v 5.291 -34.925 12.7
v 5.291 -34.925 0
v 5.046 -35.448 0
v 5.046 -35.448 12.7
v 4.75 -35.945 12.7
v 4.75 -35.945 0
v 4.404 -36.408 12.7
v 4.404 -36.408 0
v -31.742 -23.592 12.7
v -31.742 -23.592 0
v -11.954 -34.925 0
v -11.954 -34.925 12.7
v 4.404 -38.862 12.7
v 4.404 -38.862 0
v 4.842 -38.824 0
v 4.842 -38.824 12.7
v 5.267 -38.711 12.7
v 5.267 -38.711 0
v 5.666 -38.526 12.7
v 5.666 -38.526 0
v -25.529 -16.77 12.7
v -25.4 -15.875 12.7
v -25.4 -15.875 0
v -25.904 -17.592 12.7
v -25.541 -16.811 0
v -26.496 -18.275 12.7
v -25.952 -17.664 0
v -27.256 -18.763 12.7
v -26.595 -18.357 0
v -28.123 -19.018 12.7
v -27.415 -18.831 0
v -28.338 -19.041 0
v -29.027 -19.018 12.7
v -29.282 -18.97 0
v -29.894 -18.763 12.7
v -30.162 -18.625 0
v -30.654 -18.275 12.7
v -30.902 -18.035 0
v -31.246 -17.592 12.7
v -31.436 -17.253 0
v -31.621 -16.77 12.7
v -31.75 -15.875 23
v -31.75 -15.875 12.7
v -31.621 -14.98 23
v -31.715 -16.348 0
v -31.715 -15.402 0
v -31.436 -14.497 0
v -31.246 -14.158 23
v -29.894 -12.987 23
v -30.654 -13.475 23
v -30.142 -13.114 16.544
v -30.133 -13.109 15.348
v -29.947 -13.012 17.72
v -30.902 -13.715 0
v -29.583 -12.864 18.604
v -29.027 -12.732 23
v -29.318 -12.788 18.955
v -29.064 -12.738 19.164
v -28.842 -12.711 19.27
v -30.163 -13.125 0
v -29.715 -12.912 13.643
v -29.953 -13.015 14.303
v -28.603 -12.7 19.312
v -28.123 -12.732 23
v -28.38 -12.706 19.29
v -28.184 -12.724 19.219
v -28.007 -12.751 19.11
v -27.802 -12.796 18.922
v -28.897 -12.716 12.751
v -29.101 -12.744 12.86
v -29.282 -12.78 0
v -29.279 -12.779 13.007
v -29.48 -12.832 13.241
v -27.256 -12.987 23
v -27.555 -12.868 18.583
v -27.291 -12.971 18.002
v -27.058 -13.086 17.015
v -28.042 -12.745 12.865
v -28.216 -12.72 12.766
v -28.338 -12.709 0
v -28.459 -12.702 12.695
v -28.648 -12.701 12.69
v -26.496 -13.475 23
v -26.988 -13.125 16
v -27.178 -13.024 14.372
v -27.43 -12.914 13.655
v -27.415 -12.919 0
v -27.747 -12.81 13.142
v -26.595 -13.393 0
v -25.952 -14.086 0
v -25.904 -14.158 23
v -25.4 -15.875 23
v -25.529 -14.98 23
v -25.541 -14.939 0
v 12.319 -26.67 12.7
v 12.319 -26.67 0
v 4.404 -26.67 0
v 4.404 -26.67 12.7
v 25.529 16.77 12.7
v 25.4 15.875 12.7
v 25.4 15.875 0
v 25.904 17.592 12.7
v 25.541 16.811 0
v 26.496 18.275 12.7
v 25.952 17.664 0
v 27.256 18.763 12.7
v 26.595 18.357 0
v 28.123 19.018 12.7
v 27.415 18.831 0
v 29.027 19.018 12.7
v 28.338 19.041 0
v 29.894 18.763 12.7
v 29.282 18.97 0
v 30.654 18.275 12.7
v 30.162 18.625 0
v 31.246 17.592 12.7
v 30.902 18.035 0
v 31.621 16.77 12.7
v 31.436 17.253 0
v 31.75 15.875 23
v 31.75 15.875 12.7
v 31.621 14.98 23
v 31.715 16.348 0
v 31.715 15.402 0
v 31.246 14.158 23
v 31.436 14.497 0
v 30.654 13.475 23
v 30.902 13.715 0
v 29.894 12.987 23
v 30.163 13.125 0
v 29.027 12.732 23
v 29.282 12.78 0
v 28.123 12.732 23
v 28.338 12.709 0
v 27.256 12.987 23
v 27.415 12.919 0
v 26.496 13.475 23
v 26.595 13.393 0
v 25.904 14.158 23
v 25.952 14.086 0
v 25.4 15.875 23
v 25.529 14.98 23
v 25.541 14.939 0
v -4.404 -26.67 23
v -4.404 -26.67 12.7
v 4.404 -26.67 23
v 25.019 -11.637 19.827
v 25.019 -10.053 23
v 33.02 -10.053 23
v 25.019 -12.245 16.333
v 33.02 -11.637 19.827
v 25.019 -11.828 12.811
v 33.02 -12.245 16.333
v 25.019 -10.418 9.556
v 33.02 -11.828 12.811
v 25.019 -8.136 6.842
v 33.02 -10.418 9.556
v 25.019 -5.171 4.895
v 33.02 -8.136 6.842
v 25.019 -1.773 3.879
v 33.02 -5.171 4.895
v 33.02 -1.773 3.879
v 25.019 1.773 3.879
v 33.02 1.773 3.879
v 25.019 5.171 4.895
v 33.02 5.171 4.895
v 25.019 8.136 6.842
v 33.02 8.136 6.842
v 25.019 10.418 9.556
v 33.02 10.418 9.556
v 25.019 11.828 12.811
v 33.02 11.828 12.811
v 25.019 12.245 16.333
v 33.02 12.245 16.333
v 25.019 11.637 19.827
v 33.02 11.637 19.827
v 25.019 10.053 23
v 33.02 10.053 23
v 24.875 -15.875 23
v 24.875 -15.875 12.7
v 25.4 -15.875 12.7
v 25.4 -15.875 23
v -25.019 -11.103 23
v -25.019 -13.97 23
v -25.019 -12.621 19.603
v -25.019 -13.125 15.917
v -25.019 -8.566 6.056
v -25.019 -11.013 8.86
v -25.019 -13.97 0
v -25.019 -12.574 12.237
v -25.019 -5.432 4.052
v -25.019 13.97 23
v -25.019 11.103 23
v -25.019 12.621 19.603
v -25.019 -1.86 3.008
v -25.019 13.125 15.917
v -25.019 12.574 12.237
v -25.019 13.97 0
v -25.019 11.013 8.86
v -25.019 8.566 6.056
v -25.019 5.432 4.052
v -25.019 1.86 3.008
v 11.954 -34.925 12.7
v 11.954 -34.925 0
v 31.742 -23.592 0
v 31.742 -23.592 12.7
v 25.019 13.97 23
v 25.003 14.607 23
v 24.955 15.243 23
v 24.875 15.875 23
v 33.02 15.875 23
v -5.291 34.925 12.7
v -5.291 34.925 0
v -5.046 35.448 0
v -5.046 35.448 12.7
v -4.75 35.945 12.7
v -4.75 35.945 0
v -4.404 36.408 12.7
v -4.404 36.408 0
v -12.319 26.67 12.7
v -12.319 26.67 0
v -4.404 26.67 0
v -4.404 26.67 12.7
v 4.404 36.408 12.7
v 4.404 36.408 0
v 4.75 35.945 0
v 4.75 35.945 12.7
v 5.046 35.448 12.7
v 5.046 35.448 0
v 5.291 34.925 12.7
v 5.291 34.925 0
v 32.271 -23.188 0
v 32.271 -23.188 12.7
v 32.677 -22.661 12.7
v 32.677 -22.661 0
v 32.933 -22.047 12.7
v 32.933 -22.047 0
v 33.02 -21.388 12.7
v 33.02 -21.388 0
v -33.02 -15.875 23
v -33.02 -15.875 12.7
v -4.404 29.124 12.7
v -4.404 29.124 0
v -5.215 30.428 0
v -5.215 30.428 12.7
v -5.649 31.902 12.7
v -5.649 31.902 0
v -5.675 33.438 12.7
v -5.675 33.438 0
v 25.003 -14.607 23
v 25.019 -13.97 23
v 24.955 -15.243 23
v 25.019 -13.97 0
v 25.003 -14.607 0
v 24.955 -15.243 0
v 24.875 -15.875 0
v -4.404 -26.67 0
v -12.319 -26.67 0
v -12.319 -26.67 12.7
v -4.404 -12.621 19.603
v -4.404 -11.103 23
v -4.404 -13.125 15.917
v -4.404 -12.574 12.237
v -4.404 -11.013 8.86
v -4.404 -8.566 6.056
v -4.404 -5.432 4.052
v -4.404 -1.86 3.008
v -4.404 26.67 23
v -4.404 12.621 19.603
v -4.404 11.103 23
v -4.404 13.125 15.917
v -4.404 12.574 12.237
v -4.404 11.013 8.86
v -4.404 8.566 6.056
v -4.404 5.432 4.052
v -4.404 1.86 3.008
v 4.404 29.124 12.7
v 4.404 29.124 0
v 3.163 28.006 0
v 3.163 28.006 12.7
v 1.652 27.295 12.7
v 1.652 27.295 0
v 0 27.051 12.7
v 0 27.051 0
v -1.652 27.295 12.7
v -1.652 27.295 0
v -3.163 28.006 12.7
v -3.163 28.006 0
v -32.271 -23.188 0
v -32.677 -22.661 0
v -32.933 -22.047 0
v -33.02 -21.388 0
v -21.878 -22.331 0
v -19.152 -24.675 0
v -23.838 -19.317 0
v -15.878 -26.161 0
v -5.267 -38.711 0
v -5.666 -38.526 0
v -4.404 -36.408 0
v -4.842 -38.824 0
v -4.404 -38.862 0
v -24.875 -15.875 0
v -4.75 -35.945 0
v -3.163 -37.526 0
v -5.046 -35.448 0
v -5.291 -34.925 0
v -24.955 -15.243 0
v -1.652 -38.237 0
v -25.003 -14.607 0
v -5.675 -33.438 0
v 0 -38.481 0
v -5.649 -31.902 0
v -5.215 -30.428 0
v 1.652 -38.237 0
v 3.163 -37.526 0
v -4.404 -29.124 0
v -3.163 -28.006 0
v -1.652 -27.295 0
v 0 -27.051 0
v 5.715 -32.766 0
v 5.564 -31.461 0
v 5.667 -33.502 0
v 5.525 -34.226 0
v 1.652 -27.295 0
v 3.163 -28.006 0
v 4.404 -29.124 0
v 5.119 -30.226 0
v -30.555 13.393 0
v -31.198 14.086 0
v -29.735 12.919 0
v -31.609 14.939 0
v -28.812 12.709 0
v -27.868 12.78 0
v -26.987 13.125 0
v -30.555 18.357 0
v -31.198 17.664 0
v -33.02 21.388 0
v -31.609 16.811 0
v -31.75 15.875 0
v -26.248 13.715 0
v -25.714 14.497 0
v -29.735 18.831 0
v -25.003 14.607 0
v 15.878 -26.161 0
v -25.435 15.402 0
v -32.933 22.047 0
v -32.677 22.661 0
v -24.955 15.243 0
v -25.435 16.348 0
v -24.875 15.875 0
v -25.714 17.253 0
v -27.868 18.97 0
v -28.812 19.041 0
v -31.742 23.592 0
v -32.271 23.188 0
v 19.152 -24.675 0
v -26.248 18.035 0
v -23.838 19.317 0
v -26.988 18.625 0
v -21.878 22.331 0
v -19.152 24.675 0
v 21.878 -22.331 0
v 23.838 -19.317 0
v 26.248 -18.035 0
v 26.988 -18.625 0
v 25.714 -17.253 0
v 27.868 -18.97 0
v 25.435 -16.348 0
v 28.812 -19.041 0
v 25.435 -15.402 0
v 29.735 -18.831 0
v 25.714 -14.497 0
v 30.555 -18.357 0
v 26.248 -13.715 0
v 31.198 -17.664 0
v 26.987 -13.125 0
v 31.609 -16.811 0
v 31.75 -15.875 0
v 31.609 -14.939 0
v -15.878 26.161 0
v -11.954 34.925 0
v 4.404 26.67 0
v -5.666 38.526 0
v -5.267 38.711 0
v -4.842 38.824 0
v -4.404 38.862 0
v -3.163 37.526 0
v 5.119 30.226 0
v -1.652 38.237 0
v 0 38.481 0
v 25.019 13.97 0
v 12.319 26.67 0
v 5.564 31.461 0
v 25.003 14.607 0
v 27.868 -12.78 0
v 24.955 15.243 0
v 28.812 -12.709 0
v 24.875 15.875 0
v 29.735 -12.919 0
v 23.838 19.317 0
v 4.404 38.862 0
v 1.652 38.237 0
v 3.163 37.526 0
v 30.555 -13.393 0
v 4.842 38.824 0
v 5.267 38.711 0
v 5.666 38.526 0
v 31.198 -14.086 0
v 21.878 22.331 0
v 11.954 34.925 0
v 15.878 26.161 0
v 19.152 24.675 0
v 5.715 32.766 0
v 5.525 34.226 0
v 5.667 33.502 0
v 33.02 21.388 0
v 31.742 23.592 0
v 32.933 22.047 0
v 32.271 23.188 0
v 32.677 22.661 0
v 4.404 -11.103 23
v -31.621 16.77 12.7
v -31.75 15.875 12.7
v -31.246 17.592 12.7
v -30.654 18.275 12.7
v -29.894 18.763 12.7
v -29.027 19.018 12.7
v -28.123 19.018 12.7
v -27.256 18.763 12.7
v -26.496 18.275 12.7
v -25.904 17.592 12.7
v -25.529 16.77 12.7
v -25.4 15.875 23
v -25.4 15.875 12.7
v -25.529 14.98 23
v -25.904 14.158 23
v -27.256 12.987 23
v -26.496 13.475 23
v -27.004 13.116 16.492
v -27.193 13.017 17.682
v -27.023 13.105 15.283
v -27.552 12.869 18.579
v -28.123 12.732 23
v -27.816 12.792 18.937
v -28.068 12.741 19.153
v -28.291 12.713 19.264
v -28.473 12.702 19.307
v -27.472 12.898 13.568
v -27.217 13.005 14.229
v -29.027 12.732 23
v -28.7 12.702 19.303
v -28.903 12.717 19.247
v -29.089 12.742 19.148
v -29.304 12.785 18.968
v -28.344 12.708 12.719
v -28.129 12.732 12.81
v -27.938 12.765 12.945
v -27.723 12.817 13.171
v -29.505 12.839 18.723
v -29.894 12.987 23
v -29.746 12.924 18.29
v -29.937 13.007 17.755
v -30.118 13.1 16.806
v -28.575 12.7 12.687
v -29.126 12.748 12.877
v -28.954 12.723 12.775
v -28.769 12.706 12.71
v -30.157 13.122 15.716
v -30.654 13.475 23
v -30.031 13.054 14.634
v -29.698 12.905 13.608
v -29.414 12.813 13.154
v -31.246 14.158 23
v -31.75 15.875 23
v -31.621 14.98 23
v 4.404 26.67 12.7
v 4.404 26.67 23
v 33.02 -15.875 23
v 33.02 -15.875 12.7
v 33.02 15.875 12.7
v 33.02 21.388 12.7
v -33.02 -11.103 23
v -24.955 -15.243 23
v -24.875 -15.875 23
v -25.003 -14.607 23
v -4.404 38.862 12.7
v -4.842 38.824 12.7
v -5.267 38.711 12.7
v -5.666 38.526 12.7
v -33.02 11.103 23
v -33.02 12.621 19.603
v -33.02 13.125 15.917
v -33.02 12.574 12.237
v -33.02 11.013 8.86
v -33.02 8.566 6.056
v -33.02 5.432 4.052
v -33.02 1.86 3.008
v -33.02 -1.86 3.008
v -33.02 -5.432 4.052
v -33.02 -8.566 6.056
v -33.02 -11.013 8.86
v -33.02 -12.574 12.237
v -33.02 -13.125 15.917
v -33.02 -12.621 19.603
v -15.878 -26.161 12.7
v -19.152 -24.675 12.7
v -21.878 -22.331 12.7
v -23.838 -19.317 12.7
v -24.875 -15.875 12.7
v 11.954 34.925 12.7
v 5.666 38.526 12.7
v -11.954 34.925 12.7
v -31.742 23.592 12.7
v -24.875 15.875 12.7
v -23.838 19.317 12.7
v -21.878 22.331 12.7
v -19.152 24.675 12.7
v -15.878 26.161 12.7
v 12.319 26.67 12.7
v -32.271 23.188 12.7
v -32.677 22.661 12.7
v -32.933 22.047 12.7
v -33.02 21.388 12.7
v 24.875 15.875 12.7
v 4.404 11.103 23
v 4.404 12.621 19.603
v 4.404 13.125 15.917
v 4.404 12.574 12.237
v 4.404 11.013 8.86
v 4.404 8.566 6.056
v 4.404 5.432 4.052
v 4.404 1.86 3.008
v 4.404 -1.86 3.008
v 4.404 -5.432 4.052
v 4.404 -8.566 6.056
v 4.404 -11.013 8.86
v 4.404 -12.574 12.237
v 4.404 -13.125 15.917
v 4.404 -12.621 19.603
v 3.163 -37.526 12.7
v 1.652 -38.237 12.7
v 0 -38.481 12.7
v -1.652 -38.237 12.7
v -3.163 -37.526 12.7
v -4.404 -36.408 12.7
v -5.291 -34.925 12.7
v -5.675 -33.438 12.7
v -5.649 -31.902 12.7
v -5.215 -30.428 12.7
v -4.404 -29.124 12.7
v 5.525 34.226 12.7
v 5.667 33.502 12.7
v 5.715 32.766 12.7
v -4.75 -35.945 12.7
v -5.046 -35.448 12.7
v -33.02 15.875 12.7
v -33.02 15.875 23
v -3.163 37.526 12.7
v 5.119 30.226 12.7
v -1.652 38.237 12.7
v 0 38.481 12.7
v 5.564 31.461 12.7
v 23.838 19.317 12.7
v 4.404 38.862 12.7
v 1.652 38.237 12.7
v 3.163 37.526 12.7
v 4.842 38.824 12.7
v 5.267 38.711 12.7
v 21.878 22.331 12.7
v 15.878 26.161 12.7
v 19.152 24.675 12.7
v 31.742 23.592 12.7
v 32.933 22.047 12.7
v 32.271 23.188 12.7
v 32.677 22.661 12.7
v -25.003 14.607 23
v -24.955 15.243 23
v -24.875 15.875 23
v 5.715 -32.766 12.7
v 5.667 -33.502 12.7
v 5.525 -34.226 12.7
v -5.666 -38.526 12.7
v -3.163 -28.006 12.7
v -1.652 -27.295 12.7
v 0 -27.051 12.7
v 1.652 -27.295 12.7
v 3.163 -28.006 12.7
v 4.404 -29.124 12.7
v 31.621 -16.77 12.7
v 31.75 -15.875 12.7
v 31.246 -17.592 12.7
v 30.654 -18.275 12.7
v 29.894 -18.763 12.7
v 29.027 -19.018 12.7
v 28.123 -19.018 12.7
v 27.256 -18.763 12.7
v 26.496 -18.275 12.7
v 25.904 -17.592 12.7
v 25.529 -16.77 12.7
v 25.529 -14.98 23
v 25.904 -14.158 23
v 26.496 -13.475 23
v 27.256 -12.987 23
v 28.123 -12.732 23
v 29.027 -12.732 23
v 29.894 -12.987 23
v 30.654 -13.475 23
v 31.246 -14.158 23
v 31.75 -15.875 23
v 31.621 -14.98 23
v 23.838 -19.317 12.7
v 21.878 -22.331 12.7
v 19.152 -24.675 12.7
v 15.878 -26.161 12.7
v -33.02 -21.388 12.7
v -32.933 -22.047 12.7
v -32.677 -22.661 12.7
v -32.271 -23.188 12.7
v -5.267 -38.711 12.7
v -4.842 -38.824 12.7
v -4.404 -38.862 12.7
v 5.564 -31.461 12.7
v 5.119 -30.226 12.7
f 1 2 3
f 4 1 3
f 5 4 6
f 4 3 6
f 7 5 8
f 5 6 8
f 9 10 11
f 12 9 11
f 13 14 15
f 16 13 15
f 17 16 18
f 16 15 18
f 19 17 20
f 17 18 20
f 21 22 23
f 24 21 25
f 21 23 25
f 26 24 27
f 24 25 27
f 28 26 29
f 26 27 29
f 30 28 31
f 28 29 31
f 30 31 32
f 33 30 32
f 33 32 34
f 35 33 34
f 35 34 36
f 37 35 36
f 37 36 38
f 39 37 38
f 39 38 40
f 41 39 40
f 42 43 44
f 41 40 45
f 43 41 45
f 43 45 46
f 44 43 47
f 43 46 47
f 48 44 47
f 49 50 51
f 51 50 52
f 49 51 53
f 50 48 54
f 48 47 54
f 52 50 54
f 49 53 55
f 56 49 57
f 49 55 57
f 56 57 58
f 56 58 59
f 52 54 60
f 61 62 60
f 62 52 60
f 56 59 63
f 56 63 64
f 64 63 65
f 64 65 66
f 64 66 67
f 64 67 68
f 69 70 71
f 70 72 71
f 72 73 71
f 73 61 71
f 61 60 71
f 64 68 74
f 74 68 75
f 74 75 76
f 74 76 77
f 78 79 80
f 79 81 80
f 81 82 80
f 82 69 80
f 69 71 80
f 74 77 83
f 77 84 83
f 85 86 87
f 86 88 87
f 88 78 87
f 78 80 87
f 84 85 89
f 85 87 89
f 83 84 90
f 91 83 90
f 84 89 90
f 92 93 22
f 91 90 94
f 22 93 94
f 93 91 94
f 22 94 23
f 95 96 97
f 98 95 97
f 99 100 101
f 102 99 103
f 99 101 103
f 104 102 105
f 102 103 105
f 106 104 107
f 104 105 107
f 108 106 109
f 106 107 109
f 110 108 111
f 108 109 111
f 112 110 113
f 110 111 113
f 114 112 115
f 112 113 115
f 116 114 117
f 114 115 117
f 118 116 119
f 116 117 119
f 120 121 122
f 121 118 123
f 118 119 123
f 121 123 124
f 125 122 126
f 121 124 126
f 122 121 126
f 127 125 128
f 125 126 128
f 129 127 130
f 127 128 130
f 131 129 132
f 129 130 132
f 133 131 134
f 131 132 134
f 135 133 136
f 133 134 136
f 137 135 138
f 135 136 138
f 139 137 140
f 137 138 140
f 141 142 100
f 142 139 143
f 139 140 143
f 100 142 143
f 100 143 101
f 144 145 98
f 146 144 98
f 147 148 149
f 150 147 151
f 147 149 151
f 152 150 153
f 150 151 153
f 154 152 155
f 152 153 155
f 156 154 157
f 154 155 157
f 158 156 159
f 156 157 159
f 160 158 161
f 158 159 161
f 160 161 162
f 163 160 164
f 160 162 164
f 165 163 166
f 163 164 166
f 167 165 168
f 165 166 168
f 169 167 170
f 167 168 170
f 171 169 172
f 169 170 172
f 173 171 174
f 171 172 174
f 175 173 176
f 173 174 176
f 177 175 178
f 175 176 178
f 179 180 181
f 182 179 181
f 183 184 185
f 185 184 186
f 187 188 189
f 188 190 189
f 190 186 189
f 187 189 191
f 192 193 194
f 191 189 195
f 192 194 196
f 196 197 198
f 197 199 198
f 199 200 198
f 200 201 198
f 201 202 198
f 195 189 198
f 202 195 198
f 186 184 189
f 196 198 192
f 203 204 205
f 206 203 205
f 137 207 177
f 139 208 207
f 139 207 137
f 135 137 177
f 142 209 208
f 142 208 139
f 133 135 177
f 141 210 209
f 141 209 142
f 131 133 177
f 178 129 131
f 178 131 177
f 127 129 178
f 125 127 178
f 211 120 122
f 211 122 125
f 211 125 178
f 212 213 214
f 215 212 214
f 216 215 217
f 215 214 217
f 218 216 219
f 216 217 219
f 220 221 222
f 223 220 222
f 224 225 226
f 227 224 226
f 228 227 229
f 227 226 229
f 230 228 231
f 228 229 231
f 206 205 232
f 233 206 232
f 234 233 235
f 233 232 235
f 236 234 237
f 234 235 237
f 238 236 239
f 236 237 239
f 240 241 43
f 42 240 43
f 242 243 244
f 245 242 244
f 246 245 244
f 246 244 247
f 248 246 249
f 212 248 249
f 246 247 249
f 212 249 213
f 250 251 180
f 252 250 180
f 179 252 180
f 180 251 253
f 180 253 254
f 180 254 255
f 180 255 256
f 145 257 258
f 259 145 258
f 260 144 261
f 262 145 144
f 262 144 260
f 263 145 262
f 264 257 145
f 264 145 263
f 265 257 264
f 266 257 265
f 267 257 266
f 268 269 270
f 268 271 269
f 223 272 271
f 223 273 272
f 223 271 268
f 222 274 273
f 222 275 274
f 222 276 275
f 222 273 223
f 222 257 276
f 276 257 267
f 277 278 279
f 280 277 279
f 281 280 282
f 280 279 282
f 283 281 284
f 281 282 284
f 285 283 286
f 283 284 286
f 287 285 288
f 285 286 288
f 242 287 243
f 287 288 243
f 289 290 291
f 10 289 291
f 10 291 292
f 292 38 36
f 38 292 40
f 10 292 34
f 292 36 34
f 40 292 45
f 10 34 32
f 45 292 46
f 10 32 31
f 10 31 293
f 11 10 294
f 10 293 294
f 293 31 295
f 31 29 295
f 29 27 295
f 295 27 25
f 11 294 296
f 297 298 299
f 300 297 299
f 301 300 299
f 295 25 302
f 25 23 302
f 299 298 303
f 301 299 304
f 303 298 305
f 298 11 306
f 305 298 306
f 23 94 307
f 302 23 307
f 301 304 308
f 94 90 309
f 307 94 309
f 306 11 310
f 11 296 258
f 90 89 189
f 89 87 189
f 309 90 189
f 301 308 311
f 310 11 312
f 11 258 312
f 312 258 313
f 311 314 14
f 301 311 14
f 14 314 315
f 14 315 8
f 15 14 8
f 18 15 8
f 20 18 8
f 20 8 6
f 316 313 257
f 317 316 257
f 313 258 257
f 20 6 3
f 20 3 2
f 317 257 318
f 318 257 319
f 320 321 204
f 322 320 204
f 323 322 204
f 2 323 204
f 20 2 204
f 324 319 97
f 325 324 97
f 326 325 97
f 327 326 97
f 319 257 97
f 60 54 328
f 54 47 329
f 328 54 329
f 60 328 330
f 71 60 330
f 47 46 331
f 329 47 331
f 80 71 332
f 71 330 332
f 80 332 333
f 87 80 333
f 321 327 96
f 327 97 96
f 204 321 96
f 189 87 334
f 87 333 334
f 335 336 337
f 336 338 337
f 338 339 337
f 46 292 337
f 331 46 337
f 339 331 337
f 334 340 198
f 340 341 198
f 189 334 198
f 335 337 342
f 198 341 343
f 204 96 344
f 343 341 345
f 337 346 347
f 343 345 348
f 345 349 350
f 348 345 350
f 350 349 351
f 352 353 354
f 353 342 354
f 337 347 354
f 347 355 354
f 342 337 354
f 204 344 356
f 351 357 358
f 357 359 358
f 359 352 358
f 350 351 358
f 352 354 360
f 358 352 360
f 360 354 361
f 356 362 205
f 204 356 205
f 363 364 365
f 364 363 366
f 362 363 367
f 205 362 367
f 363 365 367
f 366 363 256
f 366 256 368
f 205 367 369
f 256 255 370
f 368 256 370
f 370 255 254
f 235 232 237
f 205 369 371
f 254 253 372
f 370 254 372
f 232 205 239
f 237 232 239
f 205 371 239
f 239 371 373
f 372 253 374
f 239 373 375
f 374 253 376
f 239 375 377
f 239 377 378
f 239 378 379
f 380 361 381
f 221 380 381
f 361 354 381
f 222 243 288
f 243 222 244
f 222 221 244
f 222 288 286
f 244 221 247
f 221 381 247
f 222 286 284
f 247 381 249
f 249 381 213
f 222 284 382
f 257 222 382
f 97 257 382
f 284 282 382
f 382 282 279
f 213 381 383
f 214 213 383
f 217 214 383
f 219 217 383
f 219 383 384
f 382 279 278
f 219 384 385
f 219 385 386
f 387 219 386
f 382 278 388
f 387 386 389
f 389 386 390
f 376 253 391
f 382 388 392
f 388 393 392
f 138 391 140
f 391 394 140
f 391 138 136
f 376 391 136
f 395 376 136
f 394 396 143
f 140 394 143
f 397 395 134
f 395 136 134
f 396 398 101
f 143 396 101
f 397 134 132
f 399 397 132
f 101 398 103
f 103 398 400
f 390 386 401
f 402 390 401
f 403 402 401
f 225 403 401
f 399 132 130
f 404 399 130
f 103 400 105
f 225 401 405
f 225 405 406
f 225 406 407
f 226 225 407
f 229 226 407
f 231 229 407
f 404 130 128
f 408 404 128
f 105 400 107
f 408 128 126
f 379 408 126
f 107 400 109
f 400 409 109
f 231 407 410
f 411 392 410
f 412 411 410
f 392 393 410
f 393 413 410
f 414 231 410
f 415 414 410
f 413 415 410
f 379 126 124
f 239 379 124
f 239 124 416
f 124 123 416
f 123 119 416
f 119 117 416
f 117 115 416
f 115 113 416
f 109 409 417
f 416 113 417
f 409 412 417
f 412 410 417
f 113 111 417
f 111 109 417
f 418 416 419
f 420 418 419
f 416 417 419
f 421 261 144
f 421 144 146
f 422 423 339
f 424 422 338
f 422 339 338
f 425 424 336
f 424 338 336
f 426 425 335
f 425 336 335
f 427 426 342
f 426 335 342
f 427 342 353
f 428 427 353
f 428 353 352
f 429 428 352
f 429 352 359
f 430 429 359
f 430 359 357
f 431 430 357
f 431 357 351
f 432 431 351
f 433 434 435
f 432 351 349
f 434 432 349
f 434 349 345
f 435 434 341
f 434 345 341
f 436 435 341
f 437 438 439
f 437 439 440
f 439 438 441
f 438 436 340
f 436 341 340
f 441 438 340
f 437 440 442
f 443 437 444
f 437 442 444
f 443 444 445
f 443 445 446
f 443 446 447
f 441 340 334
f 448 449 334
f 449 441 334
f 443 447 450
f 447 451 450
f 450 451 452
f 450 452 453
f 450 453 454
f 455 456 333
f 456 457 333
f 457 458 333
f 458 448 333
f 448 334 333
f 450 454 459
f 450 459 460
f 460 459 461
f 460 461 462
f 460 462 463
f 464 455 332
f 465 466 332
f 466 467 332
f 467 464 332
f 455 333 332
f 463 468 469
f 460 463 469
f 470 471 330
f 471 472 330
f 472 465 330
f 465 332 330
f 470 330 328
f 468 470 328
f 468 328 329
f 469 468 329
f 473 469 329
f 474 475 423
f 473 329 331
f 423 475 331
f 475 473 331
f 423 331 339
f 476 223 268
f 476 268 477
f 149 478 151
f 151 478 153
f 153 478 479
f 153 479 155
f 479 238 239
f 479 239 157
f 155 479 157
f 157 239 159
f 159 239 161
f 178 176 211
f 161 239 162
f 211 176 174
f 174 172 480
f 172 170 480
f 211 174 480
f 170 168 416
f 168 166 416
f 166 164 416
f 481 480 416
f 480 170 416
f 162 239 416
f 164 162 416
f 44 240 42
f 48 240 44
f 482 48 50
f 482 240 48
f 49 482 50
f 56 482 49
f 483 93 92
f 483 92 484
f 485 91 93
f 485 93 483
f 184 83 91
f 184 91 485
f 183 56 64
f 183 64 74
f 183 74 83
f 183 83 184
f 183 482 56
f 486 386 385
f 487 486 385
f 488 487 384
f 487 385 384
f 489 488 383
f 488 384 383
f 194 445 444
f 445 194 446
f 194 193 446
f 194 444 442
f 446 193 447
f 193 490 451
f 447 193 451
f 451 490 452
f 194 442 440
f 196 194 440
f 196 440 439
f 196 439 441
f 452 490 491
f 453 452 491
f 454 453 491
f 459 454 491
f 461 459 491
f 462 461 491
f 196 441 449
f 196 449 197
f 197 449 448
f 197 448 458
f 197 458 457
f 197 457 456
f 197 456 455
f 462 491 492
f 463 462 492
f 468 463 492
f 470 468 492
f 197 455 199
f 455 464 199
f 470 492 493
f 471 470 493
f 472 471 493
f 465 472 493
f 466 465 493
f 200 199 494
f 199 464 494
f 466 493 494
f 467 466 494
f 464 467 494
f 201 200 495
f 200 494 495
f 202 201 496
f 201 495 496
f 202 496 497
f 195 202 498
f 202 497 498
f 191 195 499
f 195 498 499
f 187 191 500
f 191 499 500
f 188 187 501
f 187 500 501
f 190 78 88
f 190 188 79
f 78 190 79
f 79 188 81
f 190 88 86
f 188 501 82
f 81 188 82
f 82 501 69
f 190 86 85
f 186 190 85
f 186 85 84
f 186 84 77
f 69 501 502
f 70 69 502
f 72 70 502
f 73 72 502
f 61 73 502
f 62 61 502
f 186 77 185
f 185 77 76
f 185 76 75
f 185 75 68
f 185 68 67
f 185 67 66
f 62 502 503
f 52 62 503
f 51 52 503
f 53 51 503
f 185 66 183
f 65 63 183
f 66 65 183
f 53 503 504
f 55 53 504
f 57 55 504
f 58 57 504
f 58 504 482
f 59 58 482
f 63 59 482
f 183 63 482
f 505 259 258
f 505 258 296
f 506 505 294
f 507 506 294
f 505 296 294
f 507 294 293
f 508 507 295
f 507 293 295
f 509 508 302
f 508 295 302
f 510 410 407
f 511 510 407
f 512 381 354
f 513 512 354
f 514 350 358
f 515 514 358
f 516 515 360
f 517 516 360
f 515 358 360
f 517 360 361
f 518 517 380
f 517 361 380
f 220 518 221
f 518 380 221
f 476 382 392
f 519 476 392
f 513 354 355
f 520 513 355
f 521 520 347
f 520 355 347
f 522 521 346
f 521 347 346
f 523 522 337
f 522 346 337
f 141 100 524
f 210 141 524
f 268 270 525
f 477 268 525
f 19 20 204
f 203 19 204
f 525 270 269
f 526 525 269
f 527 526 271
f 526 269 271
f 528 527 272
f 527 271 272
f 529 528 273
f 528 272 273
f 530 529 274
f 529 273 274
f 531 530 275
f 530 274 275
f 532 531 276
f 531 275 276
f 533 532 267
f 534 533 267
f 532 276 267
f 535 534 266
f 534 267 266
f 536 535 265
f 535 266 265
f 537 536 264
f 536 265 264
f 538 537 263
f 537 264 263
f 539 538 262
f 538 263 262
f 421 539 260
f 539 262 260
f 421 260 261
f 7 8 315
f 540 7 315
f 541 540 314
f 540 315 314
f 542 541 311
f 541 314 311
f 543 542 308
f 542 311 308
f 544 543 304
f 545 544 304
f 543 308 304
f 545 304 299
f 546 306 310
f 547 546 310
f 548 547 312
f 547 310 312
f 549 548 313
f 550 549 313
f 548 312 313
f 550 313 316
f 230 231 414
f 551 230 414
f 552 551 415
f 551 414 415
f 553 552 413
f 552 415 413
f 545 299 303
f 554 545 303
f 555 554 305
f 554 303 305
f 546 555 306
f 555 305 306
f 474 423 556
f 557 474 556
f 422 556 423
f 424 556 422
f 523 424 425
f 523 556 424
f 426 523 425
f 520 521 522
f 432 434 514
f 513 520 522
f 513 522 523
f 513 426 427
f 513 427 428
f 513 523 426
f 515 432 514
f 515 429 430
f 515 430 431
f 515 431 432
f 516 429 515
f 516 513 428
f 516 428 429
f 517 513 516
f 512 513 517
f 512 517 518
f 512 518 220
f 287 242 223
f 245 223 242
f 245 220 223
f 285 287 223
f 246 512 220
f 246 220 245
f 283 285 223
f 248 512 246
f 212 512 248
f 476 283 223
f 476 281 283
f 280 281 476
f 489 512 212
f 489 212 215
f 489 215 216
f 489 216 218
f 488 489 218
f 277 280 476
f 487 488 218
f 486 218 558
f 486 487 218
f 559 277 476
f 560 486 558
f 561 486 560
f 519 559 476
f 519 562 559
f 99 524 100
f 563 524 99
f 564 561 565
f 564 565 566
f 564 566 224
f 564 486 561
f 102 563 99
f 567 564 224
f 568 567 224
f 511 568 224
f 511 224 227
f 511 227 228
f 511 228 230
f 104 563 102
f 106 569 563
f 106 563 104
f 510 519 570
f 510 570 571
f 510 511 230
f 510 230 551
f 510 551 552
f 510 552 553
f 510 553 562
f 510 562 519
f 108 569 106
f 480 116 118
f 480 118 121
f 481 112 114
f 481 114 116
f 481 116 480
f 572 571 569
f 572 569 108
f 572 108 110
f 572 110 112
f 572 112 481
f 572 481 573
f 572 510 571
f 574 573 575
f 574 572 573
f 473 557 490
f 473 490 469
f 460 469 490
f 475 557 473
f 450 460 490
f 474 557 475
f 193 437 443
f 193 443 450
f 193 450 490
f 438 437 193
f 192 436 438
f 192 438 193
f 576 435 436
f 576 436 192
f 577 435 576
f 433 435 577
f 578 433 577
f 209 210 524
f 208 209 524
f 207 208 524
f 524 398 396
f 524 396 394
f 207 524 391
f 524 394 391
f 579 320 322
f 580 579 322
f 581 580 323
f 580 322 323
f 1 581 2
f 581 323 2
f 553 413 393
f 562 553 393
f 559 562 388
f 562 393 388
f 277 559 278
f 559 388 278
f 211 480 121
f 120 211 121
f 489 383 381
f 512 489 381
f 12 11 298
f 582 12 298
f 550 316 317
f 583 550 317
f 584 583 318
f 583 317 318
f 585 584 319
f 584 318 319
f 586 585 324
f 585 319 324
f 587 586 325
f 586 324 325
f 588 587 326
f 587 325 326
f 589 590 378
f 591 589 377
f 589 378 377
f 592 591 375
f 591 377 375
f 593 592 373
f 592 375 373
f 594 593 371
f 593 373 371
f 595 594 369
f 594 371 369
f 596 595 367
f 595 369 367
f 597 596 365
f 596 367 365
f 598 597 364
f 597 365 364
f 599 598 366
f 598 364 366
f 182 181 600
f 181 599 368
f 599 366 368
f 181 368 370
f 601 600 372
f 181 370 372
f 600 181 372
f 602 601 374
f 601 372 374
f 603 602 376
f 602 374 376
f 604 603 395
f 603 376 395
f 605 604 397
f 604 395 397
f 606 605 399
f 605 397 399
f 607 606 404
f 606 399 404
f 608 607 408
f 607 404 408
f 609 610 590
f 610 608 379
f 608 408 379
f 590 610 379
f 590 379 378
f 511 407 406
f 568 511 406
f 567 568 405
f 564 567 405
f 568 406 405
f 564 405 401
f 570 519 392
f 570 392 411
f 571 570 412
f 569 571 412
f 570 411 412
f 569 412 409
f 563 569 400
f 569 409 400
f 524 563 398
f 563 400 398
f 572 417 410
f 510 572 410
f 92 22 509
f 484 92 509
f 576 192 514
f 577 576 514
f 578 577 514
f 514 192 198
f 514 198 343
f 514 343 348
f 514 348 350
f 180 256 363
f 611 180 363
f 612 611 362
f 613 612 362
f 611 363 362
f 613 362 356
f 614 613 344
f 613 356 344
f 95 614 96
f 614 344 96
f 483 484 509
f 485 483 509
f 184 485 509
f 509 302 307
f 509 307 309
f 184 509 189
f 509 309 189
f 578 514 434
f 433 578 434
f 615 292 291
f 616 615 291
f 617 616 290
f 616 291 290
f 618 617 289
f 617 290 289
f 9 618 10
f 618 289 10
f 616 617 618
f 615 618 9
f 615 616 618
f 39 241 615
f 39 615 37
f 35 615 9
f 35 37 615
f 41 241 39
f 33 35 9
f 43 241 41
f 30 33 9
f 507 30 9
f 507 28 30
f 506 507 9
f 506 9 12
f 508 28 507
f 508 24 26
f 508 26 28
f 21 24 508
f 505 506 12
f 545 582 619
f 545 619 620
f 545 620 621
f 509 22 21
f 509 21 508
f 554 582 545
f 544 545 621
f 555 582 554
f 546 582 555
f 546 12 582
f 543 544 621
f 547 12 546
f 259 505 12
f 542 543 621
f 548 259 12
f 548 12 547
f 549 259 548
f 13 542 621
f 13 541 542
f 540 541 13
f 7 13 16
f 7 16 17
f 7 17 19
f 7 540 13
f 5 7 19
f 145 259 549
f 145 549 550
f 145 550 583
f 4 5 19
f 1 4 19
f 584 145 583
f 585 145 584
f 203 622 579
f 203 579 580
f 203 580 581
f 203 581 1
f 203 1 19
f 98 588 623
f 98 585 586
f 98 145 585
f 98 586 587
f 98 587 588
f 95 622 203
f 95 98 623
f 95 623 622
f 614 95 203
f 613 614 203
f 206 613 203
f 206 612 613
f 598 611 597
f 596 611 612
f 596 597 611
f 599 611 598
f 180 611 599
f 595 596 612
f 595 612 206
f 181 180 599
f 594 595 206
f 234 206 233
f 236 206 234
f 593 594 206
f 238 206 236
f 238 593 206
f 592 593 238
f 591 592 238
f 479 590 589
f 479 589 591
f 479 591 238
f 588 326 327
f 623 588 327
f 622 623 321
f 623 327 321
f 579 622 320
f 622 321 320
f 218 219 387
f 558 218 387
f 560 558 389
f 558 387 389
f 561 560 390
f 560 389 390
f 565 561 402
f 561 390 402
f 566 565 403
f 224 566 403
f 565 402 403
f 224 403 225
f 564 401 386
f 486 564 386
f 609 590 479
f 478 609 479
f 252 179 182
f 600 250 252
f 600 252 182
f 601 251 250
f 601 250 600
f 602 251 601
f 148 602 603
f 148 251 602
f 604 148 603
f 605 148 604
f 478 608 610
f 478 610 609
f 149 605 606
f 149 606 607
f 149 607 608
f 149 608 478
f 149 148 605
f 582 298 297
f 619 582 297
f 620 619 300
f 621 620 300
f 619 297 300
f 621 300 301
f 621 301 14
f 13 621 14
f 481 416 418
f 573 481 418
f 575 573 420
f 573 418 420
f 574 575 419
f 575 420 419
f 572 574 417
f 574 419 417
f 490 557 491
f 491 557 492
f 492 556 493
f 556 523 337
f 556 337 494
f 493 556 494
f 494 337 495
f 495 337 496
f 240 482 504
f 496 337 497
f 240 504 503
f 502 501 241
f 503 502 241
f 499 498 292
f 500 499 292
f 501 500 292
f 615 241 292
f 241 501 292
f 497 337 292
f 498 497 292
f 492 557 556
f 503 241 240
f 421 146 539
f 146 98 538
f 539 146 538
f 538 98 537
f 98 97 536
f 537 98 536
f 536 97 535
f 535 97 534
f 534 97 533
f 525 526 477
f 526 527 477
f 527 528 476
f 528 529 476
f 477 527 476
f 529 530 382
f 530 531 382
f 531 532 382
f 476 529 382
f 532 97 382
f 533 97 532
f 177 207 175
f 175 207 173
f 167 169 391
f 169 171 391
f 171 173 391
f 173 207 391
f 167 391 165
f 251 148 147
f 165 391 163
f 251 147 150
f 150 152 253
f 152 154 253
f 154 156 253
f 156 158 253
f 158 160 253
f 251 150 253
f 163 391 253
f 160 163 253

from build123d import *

# Parameters (mm, degrees)
BOSS_EXTRUDE1_DEPTH = 12.7
SKETCH1_4_W         = 8.808271716
SKETCH1_4_H         = 53.34
BOSS_EXTRUDE3_DEPTH = 23
CUT_EXTRUDE3_REACH  = 82.003
SKETCH9_R           = 13.125
CUT_EXTRUDE4_REACH  = 82.003
SKETCH8_R           = 12.25


with BuildPart() as part:
    # Sketch1 → Boss-Extrude1 (new body)
    with BuildSketch(Plane.XY):
        with BuildLine():
            Line((4.404135858, -36.408089009), (4.404135858, -38.862))
            ThreePointArc((4.404135858, -38.862), (5.057273366, -38.776589863), (5.666486021, -38.52610346))
            Line((5.666486021, -38.52610346), (11.954126984, -34.925))
            Line((11.954126984, -34.925), (5.291497331, -34.925))
            ThreePointArc((5.291497331, -34.925), (4.904203705, -35.700282028), (4.404135858, -36.408089009))
        make_face()
        with BuildLine():
            Line((-4.404135858, -36.408089009), (-4.404135858, -38.862))
            Line((-4.404135858, -38.862), (4.404135858, -38.862))
            Line((4.404135858, -38.862), (4.404135858, -36.408089009))
            ThreePointArc((4.404135858, -36.408089009), (0, -38.481), (-4.404135858, -36.408089009))
        make_face()
        with BuildLine():
            Line((4.404135858, -26.67), (4.404135858, -29.123910991))
            ThreePointArc((4.404135858, -29.123910991), (5.377307013, -30.830594542), (5.715, -32.766))
            ThreePointArc((5.715, -32.766), (5.60812501, -33.866072215), (5.291497331, -34.925))
            Line((5.291497331, -34.925), (11.954126984, -34.925))
            Line((11.954126984, -34.925), (31.742350164, -23.591744906))
            ThreePointArc((31.742350164, -23.591744906), (32.677495098, -22.661460621), (33.02, -21.387641446))
            Line((33.02, -21.387641446), (33.02, -15.875))
            Line((33.02, -15.875), (31.75, -15.875))
            ThreePointArc((31.75, -15.875), (28.575, -19.05), (25.4, -15.875))
            Line((25.4, -15.875), (24.875312158, -15.875))
            ThreePointArc((24.875312158, -15.875), (20.598387055, -23.600251814), (12.319, -26.67))
            Line((12.319, -26.67), (4.404135858, -26.67))
        make_face()
        with BuildLine():
            Line((-33.02, -15.875), (-33.02, -21.387641446))
            ThreePointArc((-33.02, -21.387641446), (-32.677495098, -22.661460621), (-31.742350164, -23.591744906))
            Line((-31.742350164, -23.591744906), (-11.954126984, -34.925))
            Line((-11.954126984, -34.925), (-5.291497331, -34.925))
            ThreePointArc((-5.291497331, -34.925), (-5.649290588, -31.901858317), (-4.404135858, -29.123910991))
            Line((-4.404135858, -29.123910991), (-4.404135858, -26.67))
            Line((-4.404135858, -26.67), (-12.319, -26.67))
            ThreePointArc((-12.319, -26.67), (-20.598387055, -23.600251814), (-24.875312158, -15.875))
            Line((-24.875312158, -15.875), (-25.4, -15.875))
            ThreePointArc((-25.4, -15.875), (-28.575, -19.05), (-31.75, -15.875))
            Line((-31.75, -15.875), (-33.02, -15.875))
        make_face()
        with BuildLine():
            Line((-5.291497331, -34.925), (-11.954126984, -34.925))
            Line((-11.954126984, -34.925), (-5.666486021, -38.52610346))
            ThreePointArc((-5.666486021, -38.52610346), (-5.057273366, -38.776589863), (-4.404135858, -38.862))
            Line((-4.404135858, -38.862), (-4.404135858, -36.408089009))
            ThreePointArc((-4.404135858, -36.408089009), (-4.904203705, -35.700282028), (-5.291497331, -34.925))
        make_face()
        with BuildLine():
            Line((-4.404135858, -26.67), (-4.404135858, -29.123910991))
            ThreePointArc((-4.404135858, -29.123910991), (0, -27.051), (4.404135858, -29.123910991))
            Line((4.404135858, -29.123910991), (4.404135858, -26.67))
            Line((4.404135858, -26.67), (-4.404135858, -26.67))
        make_face()
        with BuildLine():
            Line((4.404135858, 29.123910991), (4.404135858, 26.67))
            Line((4.404135858, 26.67), (12.319, 26.67))
            ThreePointArc((12.319, 26.67), (20.598387055, 23.600251814), (24.875312158, 15.875))
            Line((24.875312158, 15.875), (25.4, 15.875))
            ThreePointArc((25.4, 15.875), (28.575, 19.05), (31.75, 15.875))
            Line((31.75, 15.875), (33.02, 15.875))
            Line((33.02, 15.875), (33.02, 21.387641446))
            ThreePointArc((33.02, 21.387641446), (32.677495098, 22.661460621), (31.742350164, 23.591744906))
            Line((31.742350164, 23.591744906), (11.954126984, 34.925))
            Line((11.954126984, 34.925), (5.291497331, 34.925))
            ThreePointArc((5.291497331, 34.925), (5.60812501, 33.866072215), (5.715, 32.766))
            ThreePointArc((5.715, 32.766), (5.377307013, 30.830594542), (4.404135858, 29.123910991))
        make_face()
        with BuildLine():
            ThreePointArc((5.666486021, 38.52610346), (5.057273366, 38.776589863), (4.404135858, 38.862))
            Line((4.404135858, 38.862), (4.404135858, 36.408089009))
            ThreePointArc((4.404135858, 36.408089009), (4.904203705, 35.700282028), (5.291497331, 34.925))
            Line((5.291497331, 34.925), (11.954126984, 34.925))
            Line((11.954126984, 34.925), (5.666486021, 38.52610346))
        make_face()
        with BuildLine():
            Line((4.404135858, 38.862), (-4.404135858, 38.862))
            Line((-4.404135858, 38.862), (-4.404135858, 36.408089009))
            ThreePointArc((-4.404135858, 36.408089009), (0, 38.481), (4.404135858, 36.408089009))
            Line((4.404135858, 36.408089009), (4.404135858, 38.862))
        make_face()
        with BuildLine():
            Line((-33.02, 21.387641446), (-33.02, 15.875))
            Line((-33.02, 15.875), (-31.75, 15.875))
            ThreePointArc((-31.75, 15.875), (-28.575, 19.05), (-25.4, 15.875))
            Line((-25.4, 15.875), (-24.875312158, 15.875))
            ThreePointArc((-24.875312158, 15.875), (-20.598387055, 23.600251814), (-12.319, 26.67))
            Line((-12.319, 26.67), (-4.404135858, 26.67))
            Line((-4.404135858, 26.67), (-4.404135858, 29.123910991))
            ThreePointArc((-4.404135858, 29.123910991), (-5.649290588, 31.901858317), (-5.291497331, 34.925))
            Line((-5.291497331, 34.925), (-11.954126984, 34.925))
            Line((-11.954126984, 34.925), (-31.742350164, 23.591744906))
            ThreePointArc((-31.742350164, 23.591744906), (-32.677495098, 22.661460621), (-33.02, 21.387641446))
        make_face()
        with BuildLine():
            Line((-5.666486021, 38.52610346), (-11.954126984, 34.925))
            Line((-11.954126984, 34.925), (-5.291497331, 34.925))
            ThreePointArc((-5.291497331, 34.925), (-4.904203705, 35.700282028), (-4.404135858, 36.408089009))
            Line((-4.404135858, 36.408089009), (-4.404135858, 38.862))
            ThreePointArc((-4.404135858, 38.862), (-5.057273366, 38.776589863), (-5.666486021, 38.52610346))
        make_face()
        with BuildLine():
            Line((-4.404135858, 29.123910991), (-4.404135858, 26.67))
            Line((-4.404135858, 26.67), (4.404135858, 26.67))
            Line((4.404135858, 26.67), (4.404135858, 29.123910991))
            ThreePointArc((4.404135858, 29.123910991), (0, 27.051), (-4.404135858, 29.123910991))
        make_face()
    extrude(amount=BOSS_EXTRUDE1_DEPTH)

    # Sketch1<4> → Boss-Extrude3 (add)
    with BuildSketch(Plane.XY):
        with BuildLine():
            ThreePointArc((25.019, -13.97), (24.983027093, -14.925205632), (24.875312158, -15.875))
            Line((24.875312158, -15.875), (25.4, -15.875))
            ThreePointArc((25.4, -15.875), (28.575, -12.7), (31.75, -15.875))
            Line((31.75, -15.875), (33.02, -15.875))
            Line((33.02, -15.875), (33.02, 15.875))
            Line((33.02, 15.875), (31.75, 15.875))
            ThreePointArc((31.75, 15.875), (28.575, 12.7), (25.4, 15.875))
            Line((25.4, 15.875), (24.875312158, 15.875))
            ThreePointArc((24.875312158, 15.875), (24.983027093, 14.925205632), (25.019, 13.97))
            Line((25.019, 13.97), (25.019, -13.97))
        make_face()
        with BuildLine():
            Line((-33.02, 15.875), (-33.02, -15.875))
            Line((-33.02, -15.875), (-31.75, -15.875))
            ThreePointArc((-31.75, -15.875), (-28.575, -12.7), (-25.4, -15.875))
            Line((-25.4, -15.875), (-24.875312158, -15.875))
            ThreePointArc((-24.875312158, -15.875), (-24.983027093, -14.925205632), (-25.019, -13.97))
            Line((-25.019, -13.97), (-25.019, 13.97))
            ThreePointArc((-25.019, 13.97), (-24.983027093, 14.925205632), (-24.875312158, 15.875))
            Line((-24.875312158, 15.875), (-25.4, 15.875))
            ThreePointArc((-25.4, 15.875), (-28.575, 12.7), (-31.75, 15.875))
            Line((-31.75, 15.875), (-33.02, 15.875))
        make_face()
        Rectangle(SKETCH1_4_W, SKETCH1_4_H)
    extrude(amount=BOSS_EXTRUDE3_DEPTH)

    # Cut-Extrude3: up to this face of the body (flat: up to its plane)
    cut_extrude3_end = Plane(part.part.faces().sort_by_distance((4.404135858, 0, 11.5))[0])
    # Sketch9 → Cut-Extrude3 (cut, up to the picked face)
    with BuildSketch(Plane.ZY.offset(33.02), mode=Mode.PRIVATE) as cut_extrude3_sk1:
        with Locations((16, 0)):
            Circle(SKETCH9_R)
    cut_extrude3_tool1 = split(extrude(cut_extrude3_sk1.sketch, amount=-CUT_EXTRUDE3_REACH, mode=Mode.PRIVATE), bisect_by=cut_extrude3_end, keep=Keep.BOTH, mode=Mode.PRIVATE)
    add(cut_extrude3_tool1.solids().sort_by(Axis((-33.02, 0, 16), (1, 0, 0)))[0], mode=Mode.SUBTRACT)

    # Sketch8 → Cut-Extrude4 (cut, up to next)
    with BuildSketch(Plane(origin=(33.02, 0, 0), x_dir=(0, 0, -1), z_dir=(1, 0, 0)), mode=Mode.PRIVATE) as cut_extrude4_sk1:
        with Locations((-16, 0)):
            Circle(SKETCH8_R)
    cut_extrude4_tool1 = extrude(cut_extrude4_sk1.sketch, amount=-CUT_EXTRUDE4_REACH, mode=Mode.PRIVATE) & part.part
    add(cut_extrude4_tool1.solids().sort_by_distance((33.02, 0, 16))[0], mode=Mode.SUBTRACT)


solid = part.part
